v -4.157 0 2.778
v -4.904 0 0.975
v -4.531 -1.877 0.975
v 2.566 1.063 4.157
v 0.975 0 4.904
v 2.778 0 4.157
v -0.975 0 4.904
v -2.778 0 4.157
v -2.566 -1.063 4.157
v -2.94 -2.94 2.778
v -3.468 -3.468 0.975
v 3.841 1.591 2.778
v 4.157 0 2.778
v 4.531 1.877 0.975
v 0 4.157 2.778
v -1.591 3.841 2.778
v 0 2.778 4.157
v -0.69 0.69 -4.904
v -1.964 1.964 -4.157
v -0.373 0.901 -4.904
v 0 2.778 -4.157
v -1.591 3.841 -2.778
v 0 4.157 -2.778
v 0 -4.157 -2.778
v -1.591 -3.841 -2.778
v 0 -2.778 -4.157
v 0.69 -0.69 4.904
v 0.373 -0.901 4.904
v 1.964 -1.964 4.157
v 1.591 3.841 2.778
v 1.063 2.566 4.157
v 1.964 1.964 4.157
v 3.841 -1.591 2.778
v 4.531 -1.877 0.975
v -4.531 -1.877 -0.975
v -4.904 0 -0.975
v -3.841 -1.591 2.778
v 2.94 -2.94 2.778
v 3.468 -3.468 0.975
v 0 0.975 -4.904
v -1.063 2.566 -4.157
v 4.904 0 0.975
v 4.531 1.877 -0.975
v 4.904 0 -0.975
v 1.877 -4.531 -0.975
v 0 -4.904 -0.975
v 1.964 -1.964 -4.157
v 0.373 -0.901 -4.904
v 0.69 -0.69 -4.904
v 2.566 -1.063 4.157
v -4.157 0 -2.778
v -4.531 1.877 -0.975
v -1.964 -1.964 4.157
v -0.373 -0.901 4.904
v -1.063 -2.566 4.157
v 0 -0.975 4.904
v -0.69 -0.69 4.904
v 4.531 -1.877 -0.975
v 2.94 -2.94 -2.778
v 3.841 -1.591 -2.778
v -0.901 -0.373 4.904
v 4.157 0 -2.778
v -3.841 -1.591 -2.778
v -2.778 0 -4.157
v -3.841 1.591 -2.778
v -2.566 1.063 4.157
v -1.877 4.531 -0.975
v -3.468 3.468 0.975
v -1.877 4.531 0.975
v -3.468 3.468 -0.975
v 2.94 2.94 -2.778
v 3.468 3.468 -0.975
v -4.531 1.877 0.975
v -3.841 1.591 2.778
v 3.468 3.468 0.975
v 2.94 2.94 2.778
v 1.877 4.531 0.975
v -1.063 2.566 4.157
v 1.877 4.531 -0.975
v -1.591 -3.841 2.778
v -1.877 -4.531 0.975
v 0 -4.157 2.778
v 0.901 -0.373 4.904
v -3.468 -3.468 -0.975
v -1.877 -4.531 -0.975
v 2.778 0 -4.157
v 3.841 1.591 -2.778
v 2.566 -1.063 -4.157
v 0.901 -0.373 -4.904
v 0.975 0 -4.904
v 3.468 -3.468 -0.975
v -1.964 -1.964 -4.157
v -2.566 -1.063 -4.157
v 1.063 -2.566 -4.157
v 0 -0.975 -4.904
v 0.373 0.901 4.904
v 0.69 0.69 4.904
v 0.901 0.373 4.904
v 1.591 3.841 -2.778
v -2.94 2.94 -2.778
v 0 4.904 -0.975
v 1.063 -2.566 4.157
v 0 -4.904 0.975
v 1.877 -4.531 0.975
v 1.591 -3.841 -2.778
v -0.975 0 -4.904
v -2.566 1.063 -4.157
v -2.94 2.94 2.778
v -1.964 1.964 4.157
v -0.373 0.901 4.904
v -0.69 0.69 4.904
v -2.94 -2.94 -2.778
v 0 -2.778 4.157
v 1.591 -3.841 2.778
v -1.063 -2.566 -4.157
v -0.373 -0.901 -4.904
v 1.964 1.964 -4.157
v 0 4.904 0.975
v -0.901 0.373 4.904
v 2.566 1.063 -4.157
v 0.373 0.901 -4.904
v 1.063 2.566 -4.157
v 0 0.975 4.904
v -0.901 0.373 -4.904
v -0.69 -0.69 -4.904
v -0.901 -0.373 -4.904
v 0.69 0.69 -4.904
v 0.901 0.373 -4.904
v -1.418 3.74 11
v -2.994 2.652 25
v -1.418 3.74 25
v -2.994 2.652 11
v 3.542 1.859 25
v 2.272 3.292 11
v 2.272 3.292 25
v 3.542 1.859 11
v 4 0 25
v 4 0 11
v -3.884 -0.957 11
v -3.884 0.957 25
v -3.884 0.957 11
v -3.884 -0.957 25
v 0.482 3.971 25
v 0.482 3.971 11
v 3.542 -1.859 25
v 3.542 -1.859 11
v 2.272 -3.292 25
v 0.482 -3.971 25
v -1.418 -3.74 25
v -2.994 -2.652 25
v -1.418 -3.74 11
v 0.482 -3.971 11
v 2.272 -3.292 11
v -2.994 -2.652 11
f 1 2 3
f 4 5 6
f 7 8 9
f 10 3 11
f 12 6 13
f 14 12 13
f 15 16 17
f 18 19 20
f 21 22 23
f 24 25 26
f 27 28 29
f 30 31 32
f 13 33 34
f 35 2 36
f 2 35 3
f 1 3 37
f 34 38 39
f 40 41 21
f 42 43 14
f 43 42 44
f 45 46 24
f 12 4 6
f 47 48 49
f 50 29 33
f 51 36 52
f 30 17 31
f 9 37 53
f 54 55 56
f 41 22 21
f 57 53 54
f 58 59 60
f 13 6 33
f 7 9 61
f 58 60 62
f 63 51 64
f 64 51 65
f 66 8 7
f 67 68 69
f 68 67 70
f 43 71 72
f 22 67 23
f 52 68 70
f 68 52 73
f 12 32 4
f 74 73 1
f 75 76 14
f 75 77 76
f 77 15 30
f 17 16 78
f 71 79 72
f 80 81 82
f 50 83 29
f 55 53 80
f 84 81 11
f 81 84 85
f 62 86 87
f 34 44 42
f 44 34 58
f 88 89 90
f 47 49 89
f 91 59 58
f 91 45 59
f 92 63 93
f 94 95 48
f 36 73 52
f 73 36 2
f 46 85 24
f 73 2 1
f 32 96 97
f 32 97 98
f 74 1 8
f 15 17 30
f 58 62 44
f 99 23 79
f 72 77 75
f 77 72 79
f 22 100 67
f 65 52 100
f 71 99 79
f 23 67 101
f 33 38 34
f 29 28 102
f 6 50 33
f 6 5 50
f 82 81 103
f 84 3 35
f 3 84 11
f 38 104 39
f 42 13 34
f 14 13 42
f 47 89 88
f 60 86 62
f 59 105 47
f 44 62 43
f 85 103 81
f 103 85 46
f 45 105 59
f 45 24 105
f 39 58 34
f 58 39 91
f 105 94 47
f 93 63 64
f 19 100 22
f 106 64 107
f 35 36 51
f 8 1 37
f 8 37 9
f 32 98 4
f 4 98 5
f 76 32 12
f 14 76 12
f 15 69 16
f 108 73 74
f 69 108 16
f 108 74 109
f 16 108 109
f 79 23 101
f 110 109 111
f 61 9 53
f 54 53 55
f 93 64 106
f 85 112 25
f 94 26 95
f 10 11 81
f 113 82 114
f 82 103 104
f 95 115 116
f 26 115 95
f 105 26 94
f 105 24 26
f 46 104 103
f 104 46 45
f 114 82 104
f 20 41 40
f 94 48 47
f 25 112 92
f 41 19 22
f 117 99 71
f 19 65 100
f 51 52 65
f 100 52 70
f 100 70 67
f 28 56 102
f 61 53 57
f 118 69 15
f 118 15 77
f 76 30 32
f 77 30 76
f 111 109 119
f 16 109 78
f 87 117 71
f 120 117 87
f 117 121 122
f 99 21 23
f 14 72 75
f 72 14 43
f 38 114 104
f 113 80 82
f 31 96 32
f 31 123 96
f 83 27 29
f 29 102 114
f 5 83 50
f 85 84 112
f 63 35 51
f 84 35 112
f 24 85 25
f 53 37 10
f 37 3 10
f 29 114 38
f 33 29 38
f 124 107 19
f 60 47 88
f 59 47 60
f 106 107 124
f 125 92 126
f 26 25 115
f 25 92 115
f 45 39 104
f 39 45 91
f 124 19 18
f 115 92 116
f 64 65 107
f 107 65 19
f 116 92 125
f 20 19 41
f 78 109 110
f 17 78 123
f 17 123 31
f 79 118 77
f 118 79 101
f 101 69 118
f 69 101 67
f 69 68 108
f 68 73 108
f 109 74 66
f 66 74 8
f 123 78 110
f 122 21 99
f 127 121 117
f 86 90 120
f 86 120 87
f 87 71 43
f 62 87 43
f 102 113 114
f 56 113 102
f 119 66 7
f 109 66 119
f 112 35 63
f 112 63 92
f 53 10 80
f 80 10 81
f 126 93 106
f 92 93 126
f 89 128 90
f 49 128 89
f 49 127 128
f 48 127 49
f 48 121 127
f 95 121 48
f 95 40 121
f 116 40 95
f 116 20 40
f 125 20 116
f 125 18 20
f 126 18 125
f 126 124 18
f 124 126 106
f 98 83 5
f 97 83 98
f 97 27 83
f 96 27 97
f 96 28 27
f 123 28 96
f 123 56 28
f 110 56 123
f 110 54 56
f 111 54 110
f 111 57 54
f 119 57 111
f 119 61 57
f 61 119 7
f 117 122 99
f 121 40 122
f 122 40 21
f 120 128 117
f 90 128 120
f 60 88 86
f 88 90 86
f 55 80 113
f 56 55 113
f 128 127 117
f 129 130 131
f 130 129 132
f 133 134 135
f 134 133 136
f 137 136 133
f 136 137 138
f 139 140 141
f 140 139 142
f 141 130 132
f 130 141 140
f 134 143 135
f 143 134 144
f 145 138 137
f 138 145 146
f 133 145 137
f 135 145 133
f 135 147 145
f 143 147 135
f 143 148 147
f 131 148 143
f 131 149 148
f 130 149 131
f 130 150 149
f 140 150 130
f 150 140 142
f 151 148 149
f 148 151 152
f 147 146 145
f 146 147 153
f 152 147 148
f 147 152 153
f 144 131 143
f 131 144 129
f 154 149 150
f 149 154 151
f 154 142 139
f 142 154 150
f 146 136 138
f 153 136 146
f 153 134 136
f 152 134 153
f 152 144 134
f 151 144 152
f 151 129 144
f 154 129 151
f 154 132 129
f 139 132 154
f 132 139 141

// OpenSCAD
union(){
  translate([0, 0, 0]) sphere(r=5);
  translate([0, 0, 18]) cylinder(h=14, r1=4, r2=4, center=true);
}
